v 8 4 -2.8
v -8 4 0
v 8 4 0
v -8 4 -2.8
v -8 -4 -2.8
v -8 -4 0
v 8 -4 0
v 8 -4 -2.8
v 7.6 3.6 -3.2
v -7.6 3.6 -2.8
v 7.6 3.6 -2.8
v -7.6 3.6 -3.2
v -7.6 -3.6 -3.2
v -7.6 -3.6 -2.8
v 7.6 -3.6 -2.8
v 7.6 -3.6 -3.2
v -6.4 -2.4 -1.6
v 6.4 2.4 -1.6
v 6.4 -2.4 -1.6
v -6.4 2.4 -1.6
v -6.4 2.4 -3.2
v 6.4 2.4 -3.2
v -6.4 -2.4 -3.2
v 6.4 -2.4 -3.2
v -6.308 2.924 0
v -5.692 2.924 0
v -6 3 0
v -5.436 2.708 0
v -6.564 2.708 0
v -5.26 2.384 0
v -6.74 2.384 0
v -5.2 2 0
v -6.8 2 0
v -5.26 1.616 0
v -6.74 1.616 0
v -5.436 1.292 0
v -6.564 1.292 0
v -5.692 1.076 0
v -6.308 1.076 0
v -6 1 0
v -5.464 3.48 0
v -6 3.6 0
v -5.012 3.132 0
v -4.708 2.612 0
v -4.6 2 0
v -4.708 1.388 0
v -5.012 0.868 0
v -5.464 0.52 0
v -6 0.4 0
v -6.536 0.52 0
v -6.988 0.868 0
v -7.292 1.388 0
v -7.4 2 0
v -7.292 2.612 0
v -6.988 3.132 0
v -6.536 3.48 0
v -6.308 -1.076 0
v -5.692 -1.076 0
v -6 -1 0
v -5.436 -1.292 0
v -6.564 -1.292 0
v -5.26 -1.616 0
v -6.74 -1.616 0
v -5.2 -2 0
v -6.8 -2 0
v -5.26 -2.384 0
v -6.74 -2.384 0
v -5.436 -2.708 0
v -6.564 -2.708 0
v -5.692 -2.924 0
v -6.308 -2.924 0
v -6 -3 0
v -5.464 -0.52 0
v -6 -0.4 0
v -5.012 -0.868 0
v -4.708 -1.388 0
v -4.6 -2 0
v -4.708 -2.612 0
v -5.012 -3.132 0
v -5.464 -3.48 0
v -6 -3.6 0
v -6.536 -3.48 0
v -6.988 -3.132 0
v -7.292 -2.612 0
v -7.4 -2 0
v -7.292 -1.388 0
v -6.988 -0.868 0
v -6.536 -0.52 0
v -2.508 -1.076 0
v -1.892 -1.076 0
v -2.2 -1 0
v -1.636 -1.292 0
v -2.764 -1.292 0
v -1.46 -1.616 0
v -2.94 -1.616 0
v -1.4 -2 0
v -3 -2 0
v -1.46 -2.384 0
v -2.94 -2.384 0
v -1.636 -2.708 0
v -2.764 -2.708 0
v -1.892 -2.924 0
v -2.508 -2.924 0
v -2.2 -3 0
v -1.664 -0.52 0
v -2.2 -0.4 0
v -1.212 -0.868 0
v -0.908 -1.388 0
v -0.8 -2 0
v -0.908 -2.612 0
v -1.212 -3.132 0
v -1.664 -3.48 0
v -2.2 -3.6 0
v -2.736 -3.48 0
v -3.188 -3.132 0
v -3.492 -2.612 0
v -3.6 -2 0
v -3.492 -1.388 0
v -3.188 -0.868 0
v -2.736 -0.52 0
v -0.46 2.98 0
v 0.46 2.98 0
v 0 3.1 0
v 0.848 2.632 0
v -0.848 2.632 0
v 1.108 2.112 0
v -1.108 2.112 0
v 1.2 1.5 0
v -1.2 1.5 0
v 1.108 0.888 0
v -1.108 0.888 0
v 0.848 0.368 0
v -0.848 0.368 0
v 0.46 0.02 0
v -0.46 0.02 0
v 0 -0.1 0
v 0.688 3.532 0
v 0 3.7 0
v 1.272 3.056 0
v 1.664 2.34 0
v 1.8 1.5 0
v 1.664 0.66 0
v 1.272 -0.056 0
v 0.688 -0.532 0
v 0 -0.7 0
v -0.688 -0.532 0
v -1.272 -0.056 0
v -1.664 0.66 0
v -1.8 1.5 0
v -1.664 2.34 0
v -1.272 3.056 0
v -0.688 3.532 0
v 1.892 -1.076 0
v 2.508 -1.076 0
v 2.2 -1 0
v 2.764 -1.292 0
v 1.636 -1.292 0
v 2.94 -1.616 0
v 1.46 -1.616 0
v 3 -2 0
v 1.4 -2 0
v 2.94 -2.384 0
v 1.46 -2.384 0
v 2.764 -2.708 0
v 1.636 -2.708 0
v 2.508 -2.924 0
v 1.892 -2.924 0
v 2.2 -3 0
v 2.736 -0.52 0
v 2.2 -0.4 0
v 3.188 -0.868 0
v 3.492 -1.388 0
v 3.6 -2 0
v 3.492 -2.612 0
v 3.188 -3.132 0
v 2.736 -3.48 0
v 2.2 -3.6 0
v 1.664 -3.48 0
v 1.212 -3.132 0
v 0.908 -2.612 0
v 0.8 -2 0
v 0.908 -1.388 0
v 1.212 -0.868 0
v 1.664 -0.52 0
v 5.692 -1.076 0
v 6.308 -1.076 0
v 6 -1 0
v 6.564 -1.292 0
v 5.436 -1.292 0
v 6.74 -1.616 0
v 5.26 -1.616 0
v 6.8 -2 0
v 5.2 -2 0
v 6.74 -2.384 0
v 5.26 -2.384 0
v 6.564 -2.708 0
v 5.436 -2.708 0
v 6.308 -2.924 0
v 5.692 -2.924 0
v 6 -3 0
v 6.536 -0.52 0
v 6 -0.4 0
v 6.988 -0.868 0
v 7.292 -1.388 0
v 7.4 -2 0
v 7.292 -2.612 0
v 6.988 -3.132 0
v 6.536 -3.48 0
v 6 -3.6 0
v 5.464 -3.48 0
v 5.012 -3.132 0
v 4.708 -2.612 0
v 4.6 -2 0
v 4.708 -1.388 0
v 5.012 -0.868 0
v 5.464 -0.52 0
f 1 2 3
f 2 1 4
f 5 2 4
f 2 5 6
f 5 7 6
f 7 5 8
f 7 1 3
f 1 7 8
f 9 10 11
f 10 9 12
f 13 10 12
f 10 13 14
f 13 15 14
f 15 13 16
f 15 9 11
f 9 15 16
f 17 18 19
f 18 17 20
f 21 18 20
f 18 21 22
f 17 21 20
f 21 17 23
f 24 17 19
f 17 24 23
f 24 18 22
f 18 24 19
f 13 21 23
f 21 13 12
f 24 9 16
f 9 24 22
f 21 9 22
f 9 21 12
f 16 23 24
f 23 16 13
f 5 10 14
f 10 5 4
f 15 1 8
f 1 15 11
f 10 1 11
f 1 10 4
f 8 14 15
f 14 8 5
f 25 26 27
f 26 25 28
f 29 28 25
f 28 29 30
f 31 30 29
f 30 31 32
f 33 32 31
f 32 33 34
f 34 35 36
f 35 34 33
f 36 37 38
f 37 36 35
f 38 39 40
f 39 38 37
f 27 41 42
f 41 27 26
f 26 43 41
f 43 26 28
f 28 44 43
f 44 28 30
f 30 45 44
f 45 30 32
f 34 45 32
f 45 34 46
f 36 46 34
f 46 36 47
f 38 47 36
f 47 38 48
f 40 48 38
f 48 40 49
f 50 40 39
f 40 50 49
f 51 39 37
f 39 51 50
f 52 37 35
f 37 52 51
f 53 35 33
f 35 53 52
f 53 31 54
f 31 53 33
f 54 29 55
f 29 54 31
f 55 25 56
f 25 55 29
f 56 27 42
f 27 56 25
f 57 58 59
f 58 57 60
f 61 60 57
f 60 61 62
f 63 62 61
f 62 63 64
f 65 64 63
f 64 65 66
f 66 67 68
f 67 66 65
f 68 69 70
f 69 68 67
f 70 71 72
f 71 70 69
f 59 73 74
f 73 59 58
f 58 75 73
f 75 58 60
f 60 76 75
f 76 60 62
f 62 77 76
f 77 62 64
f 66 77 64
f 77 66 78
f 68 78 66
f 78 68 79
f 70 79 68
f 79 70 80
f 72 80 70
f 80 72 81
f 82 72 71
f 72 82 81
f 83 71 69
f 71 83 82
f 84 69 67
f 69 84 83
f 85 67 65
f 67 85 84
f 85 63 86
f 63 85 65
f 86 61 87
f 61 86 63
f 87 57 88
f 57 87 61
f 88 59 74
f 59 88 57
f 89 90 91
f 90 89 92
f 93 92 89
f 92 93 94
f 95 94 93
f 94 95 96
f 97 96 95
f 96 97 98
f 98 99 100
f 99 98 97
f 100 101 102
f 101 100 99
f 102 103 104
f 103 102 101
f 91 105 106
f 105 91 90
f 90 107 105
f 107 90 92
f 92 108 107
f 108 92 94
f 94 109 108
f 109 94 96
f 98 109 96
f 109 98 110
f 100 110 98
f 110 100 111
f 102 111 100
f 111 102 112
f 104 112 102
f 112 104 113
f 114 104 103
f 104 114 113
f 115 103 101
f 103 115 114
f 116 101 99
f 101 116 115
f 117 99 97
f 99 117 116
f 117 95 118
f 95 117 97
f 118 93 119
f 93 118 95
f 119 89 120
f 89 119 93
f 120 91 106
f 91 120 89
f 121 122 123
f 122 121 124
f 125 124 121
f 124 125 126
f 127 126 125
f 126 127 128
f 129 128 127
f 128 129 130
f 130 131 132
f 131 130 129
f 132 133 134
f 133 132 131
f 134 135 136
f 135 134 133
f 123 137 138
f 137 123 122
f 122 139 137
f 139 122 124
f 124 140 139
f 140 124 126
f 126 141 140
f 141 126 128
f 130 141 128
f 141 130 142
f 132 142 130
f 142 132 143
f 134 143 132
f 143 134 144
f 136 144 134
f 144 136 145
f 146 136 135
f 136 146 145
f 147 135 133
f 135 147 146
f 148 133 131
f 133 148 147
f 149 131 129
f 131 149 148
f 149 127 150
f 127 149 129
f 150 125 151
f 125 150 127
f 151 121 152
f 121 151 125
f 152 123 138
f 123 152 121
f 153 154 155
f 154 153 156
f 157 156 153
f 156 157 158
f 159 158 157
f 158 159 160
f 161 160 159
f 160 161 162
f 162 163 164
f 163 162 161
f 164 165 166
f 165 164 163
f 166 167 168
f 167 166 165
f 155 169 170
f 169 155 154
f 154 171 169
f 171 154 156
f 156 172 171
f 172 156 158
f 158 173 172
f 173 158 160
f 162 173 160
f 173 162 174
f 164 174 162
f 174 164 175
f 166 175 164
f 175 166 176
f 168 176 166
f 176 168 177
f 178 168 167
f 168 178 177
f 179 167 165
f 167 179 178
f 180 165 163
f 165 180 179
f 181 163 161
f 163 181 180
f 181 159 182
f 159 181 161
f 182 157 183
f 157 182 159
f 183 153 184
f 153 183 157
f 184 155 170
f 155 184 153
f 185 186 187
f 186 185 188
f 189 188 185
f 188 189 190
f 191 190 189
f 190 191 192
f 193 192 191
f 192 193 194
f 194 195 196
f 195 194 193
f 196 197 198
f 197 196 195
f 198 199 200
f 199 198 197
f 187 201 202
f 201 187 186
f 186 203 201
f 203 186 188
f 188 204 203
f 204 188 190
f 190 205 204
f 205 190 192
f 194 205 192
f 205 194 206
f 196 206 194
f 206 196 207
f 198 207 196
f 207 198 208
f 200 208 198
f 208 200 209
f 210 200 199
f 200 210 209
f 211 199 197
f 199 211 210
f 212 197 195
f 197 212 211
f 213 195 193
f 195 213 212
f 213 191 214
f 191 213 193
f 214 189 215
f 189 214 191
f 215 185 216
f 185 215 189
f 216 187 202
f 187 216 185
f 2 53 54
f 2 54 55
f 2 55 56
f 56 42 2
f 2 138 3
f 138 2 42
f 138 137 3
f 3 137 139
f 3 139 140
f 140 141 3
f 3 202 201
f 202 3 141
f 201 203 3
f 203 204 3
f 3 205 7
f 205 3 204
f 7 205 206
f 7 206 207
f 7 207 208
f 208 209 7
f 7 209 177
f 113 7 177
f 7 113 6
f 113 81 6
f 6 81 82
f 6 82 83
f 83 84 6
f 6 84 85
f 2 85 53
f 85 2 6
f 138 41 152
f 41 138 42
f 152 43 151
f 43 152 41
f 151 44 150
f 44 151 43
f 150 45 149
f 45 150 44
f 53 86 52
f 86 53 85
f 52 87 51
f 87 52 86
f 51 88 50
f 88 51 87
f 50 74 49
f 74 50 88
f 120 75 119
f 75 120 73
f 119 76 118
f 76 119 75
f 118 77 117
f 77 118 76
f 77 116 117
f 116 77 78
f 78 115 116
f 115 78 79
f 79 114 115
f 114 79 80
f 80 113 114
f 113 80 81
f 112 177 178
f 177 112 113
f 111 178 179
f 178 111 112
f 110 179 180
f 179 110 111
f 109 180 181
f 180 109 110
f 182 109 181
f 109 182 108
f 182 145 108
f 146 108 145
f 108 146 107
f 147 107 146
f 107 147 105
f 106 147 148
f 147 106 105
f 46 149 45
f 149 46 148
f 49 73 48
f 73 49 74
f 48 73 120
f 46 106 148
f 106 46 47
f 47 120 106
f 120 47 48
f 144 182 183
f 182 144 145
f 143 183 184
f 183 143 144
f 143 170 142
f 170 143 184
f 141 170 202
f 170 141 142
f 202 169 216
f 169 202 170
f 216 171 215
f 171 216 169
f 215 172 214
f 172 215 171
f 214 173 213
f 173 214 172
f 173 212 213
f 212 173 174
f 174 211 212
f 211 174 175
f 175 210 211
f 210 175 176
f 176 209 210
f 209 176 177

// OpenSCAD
// file: ../p/box5.scad
use <../lib.scad>
function ldraw_lib__box5() = [
// 0 Box with 5 Faces and All Edges
// 0 Name: box5.dat
// 0 Author: James Jessiman
// 0 !LDRAW_ORG Primitive UPDATE 2012-01
// 0 !LICENSE Licensed under CC BY 4.0 : see CAreadme.txt
// 
// 0 BFC CERTIFY CCW
  [0,"BFC","CERTIFY"],
  [0,"BFC","CCW"],
// 
// 0 !HISTORY 2002-04-03 [sbliss] Modified for BFC compliance
// 0 !HISTORY 2002-04-25 [PTadmin] Official Update 2002-02
// 0 !HISTORY 2007-06-24 [PTadmin] Header formatted for Contributor Agreement
// 0 !HISTORY 2008-07-01 [PTadmin] Official Update 2008-01
// 0 !HISTORY 2012-02-16 [Philo] Changed to CCW
// 0 !HISTORY 2012-03-30 [PTadmin] Official Update 2012-01
// 
// 
// 2 24 1 1 1 -1 1 1
  [2,24,1,1,1,-1,1,1],
// 2 24 -1 1 1 -1 1 -1
  [2,24,-1,1,1,-1,1,-1],
// 2 24 -1 1 -1 1 1 -1
  [2,24,-1,1,-1,1,1,-1],
// 2 24 1 1 -1 1 1 1
  [2,24,1,1,-1,1,1,1],
// 2 24 1 0 1 -1 0 1
  [2,24,1,0,1,-1,0,1],
// 2 24 -1 0 1 -1 0 -1
  [2,24,-1,0,1,-1,0,-1],
// 2 24 -1 0 -1 1 0 -1
  [2,24,-1,0,-1,1,0,-1],
// 2 24 1 0 -1 1 0 1
  [2,24,1,0,-1,1,0,1],
// 2 24 1 0 1 1 1 1
  [2,24,1,0,1,1,1,1],
// 2 24 -1 0 1 -1 1 1
  [2,24,-1,0,1,-1,1,1],
// 2 24 1 0 -1 1 1 -1
  [2,24,1,0,-1,1,1,-1],
// 2 24 -1 0 -1 -1 1 -1
  [2,24,-1,0,-1,-1,1,-1],
// 4 16 -1 1 1 1 1 1 1 1 -1 -1 1 -1
  [4,16,-1,1,1,1,1,1,1,1,-1,-1,1,-1],
// 4 16 -1 1 1 -1 0 1 1 0 1 1 1 1
  [4,16,-1,1,1,-1,0,1,1,0,1,1,1,1],
// 4 16 -1 1 -1 -1 0 -1 -1 0 1 -1 1 1
  [4,16,-1,1,-1,-1,0,-1,-1,0,1,-1,1,1],
// 4 16 1 1 -1 1 0 -1 -1 0 -1 -1 1 -1
  [4,16,1,1,-1,1,0,-1,-1,0,-1,-1,1,-1],
// 4 16 1 1 1 1 0 1 1 0 -1 1 1 -1
  [4,16,1,1,1,1,0,1,1,0,-1,1,1,-1],
];
module ldraw_lib__box5(step=0, col=false, unit=2/5, alt=false, line=0.2, solid=!$preview)
    makepoly(ldraw_lib__box5(), step=step, col=col, unit=unit, alt=alt, line=line, solid=solid);
ldraw_lib__box5(line=0.2);
// file: ../p/box4.scad
use <../lib.scad>
function ldraw_lib__box4() = [
// 0 Box with 4 Faces (2 Parallel Pairs) and All Edges
// 0 Name: box4.dat
// 0 Author: James Jessiman
// 0 !LDRAW_ORG Primitive UPDATE 2012-01
// 0 !LICENSE Licensed under CC BY 4.0 : see CAreadme.txt
// 
// 0 BFC CERTIFY CCW
  [0,"BFC","CERTIFY"],
  [0,"BFC","CCW"],
// 
// 0 !HISTORY 2002-04-03 [sbliss] Modified for BFC compliance
// 0 !HISTORY 2002-04-25 [PTadmin] Official Update 2002-02
// 0 !HISTORY 2007-06-24 [PTadmin] Header formatted for Contributor Agreement
// 0 !HISTORY 2008-07-01 [PTadmin] Official Update 2008-01
// 0 !HISTORY 2012-02-16 [Philo] Changed to CCW
// 0 !HISTORY 2012-03-30 [PTadmin] Official Update 2012-01
// 
// 
// 2 24 1 1 1 -1 1 1
  [2,24,1,1,1,-1,1,1],
// 2 24 -1 1 1 -1 1 -1
  [2,24,-1,1,1,-1,1,-1],
// 2 24 -1 1 -1 1 1 -1
  [2,24,-1,1,-1,1,1,-1],
// 2 24 1 1 -1 1 1 1
  [2,24,1,1,-1,1,1,1],
// 2 24 1 0 1 -1 0 1
  [2,24,1,0,1,-1,0,1],
// 2 24 -1 0 1 -1 0 -1
  [2,24,-1,0,1,-1,0,-1],
// 2 24 -1 0 -1 1 0 -1
  [2,24,-1,0,-1,1,0,-1],
// 2 24 1 0 -1 1 0 1
  [2,24,1,0,-1,1,0,1],
// 2 24 1 0 1 1 1 1
  [2,24,1,0,1,1,1,1],
// 2 24 -1 0 1 -1 1 1
  [2,24,-1,0,1,-1,1,1],
// 2 24 1 0 -1 1 1 -1
  [2,24,1,0,-1,1,1,-1],
// 2 24 -1 0 -1 -1 1 -1
  [2,24,-1,0,-1,-1,1,-1],
// 4 16 -1 1 1 -1 0 1 1 0 1 1 1 1
  [4,16,-1,1,1,-1,0,1,1,0,1,1,1,1],
// 4 16 -1 1 -1 -1 0 -1 -1 0 1 -1 1 1
  [4,16,-1,1,-1,-1,0,-1,-1,0,1,-1,1,1],
// 4 16 1 1 -1 1 0 -1 -1 0 -1 -1 1 -1
  [4,16,1,1,-1,1,0,-1,-1,0,-1,-1,1,-1],
// 4 16 1 1 1 1 0 1 1 0 -1 1 1 -1
  [4,16,1,1,1,1,0,1,1,0,-1,1,1,-1],
];
module ldraw_lib__box4(step=0, col=false, unit=2/5, alt=false, line=0.2, solid=!$preview)
    makepoly(ldraw_lib__box4(), step=step, col=col, unit=unit, alt=alt, line=line, solid=solid);
ldraw_lib__box4(line=0.2);
// file: s/3069bs01.scad
use <../../lib.scad>
use <../../p/box4.scad>
use <../../p/box5.scad>
function ldraw_lib__s__3069bs01() = [
// 0 ~Tile  1 x  2 with Groove without Top Face
// 0 Name: s\3069bs01.dat
// 0 Author: Santeri Piippo [arezey]
// 0 !LDRAW_ORG Subpart UPDATE 2010-02
// 0 !LICENSE Licensed under CC BY 4.0 : see CAreadme.txt
// 
// 0 BFC CERTIFY CCW
  [0,"BFC","CERTIFY"],
  [0,"BFC","CCW"],
// 
// 0 !HISTORY 2010-07-05 [PTadmin] Official Update 2010-02
// 
// 
// 1 16 0 0 0 20 0 0 0 7 0 0 0 10 box4.dat
  [1,16,0,0,0,20,0,0,0,7,0,0,0,10, ldraw_lib__box4()],
// 1 16 0 7 0 19 0 0 0 1 0 0 0 9 box4.dat
  [1,16,0,7,0,19,0,0,0,1,0,0,0,9, ldraw_lib__box4()],
// 0 BFC INVERTNEXT
  [0,"BFC","INVERTNEXT"],
// 1 16 0 8 0 16 0 0 0 -4 0 0 0 6 box5.dat
  [1,16,0,8,0,16,0,0,0,-4,0,0,0,6, ldraw_lib__box5()],
// 4 16 -19 8 9 -16 8 6 -16 8 -6 -19 8 -9
  [4,16,-19,8,9,-16,8,6,-16,8,-6,-19,8,-9],
// 4 16 19 8 -9 16 8 -6 16 8 6 19 8 9
  [4,16,19,8,-9,16,8,-6,16,8,6,19,8,9],
// 4 16 19 8 9 16 8 6 -16 8 6 -19 8 9
  [4,16,19,8,9,16,8,6,-16,8,6,-19,8,9],
// 4 16 -19 8 -9 -16 8 -6 16 8 -6 19 8 -9
  [4,16,-19,8,-9,-16,8,-6,16,8,-6,19,8,-9],
// 4 16 -20 7 10 -19 7 9 -19 7 -9 -20 7 -10
  [4,16,-20,7,10,-19,7,9,-19,7,-9,-20,7,-10],
// 4 16 20 7 -10 19 7 -9 19 7 9 20 7 10
  [4,16,20,7,-10,19,7,-9,19,7,9,20,7,10],
// 4 16 20 7 10 19 7 9 -19 7 9 -20 7 10
  [4,16,20,7,10,19,7,9,-19,7,9,-20,7,10],
// 4 16 -20 7 -10 -19 7 -9 19 7 -9 20 7 -10
  [4,16,-20,7,-10,-19,7,-9,19,7,-9,20,7,-10],
// 0 //
];
module ldraw_lib__s__3069bs01(step=0, col=false, unit=2/5, alt=false, line=0.2, solid=!$preview)
    makepoly(ldraw_lib__s__3069bs01(), step=step, col=col, unit=unit, alt=alt, line=line, solid=solid);
ldraw_lib__s__3069bs01(line=0.2);
// main file
use <../lib.scad>
use <s/3069bs01.scad>
function ldraw_lib__3069bpzj() = [
// 0 Tile  1 x  2 with  6 Coloured Ovals with Black Outlines Pattern
// 0 Name: 3069bpzj.dat
// 0 Author: Vincent Messenet [Cheenzo]
// 0 !LDRAW_ORG Part UPDATE 2020-03
// 0 !LICENSE Licensed under CC BY 4.0 : see CAreadme.txt
// 
// 0 BFC CERTIFY CCW
  [0,"BFC","CERTIFY"],
  [0,"BFC","CCW"],
// 
// 0 !KEYWORDS Avengers, Brickheadz, BrickLink 3069bpb638, Infinity Gauntlet
// 0 !KEYWORDS Infinity War, Set 41605, Thanos
// 
// 0 !HISTORY 2020-12-29 [PTadmin] Official Update 2020-03
// 
// 
// 1 16 0 0 0 1 0 0 0 1 0 0 0 1 s\3069bs01.dat
  [1,16,0,0,0,1,0,0,0,1,0,0,0,1, ldraw_lib__s__3069bs01()],
// 
// 4 27 -14.23 0 7.31 -15 0 7.5 -15.77 0 7.31 -13.59 0 6.77
  [4,27,-14.23,0,7.31,-15,0,7.5,-15.77,0,7.31,-13.59,0,6.77],
// 4 27 -13.15 0 5.96 -13.59 0 6.77 -15.77 0 7.31 -16.41 0 6.77
  [4,27,-13.15,0,5.96,-13.59,0,6.77,-15.77,0,7.31,-16.41,0,6.77],
// 4 27 -13 0 5 -13.15 0 5.96 -16.41 0 6.77 -16.85 0 5.96
  [4,27,-13,0,5,-13.15,0,5.96,-16.41,0,6.77,-16.85,0,5.96],
// 4 27 -13.15 0 4.04 -13 0 5 -16.85 0 5.96 -17 0 5
  [4,27,-13.15,0,4.04,-13,0,5,-16.85,0,5.96,-17,0,5],
// 4 27 -13.59 0 3.23 -13.15 0 4.04 -17 0 5 -16.85 0 4.04
  [4,27,-13.59,0,3.23,-13.15,0,4.04,-17,0,5,-16.85,0,4.04],
// 4 27 -14.23 0 2.69 -13.59 0 3.23 -16.85 0 4.04 -16.41 0 3.23
  [4,27,-14.23,0,2.69,-13.59,0,3.23,-16.85,0,4.04,-16.41,0,3.23],
// 4 27 -15 0 2.5 -14.23 0 2.69 -16.41 0 3.23 -15.77 0 2.69
  [4,27,-15,0,2.5,-14.23,0,2.69,-16.41,0,3.23,-15.77,0,2.69],
// 
// 4 0 -13.66 0 8.7 -15 0 9 -15 0 7.5 -14.23 0 7.31
  [4,0,-13.66,0,8.7,-15,0,9,-15,0,7.5,-14.23,0,7.31],
// 4 0 -12.53 0 7.83 -13.66 0 8.7 -14.23 0 7.31 -13.59 0 6.77
  [4,0,-12.53,0,7.83,-13.66,0,8.7,-14.23,0,7.31,-13.59,0,6.77],
// 4 0 -11.77 0 6.53 -12.53 0 7.83 -13.59 0 6.77 -13.15 0 5.96
  [4,0,-11.77,0,6.53,-12.53,0,7.83,-13.59,0,6.77,-13.15,0,5.96],
// 4 0 -11.5 0 5 -11.77 0 6.53 -13.15 0 5.96 -13 0 5
  [4,0,-11.5,0,5,-11.77,0,6.53,-13.15,0,5.96,-13,0,5],
// 4 0 -11.77 0 3.47 -11.5 0 5 -13 0 5 -13.15 0 4.04
  [4,0,-11.77,0,3.47,-11.5,0,5,-13,0,5,-13.15,0,4.04],
// 4 0 -12.53 0 2.17 -11.77 0 3.47 -13.15 0 4.04 -13.59 0 3.23
  [4,0,-12.53,0,2.17,-11.77,0,3.47,-13.15,0,4.04,-13.59,0,3.23],
// 4 0 -13.66 0 1.3 -12.53 0 2.17 -13.59 0 3.23 -14.23 0 2.69
  [4,0,-13.66,0,1.3,-12.53,0,2.17,-13.59,0,3.23,-14.23,0,2.69],
// 4 0 -15 0 1 -13.66 0 1.3 -14.23 0 2.69 -15 0 2.5
  [4,0,-15,0,1,-13.66,0,1.3,-14.23,0,2.69,-15,0,2.5],
// 4 0 -16.34 0 1.3 -15 0 1 -15 0 2.5 -15.77 0 2.69
  [4,0,-16.34,0,1.3,-15,0,1,-15,0,2.5,-15.77,0,2.69],
// 4 0 -16.34 0 1.3 -15.77 0 2.69 -16.41 0 3.23 -17.47 0 2.17
  [4,0,-16.34,0,1.3,-15.77,0,2.69,-16.41,0,3.23,-17.47,0,2.17],
// 4 0 -17.47 0 2.17 -16.41 0 3.23 -16.85 0 4.04 -18.23 0 3.47
  [4,0,-17.47,0,2.17,-16.41,0,3.23,-16.85,0,4.04,-18.23,0,3.47],
// 4 0 -18.23 0 3.47 -16.85 0 4.04 -17 0 5 -18.5 0 5
  [4,0,-18.23,0,3.47,-16.85,0,4.04,-17,0,5,-18.5,0,5],
// 4 0 -18.5 0 5 -17 0 5 -16.85 0 5.96 -18.23 0 6.53
  [4,0,-18.5,0,5,-17,0,5,-16.85,0,5.96,-18.23,0,6.53],
// 4 0 -17.47 0 7.83 -18.23 0 6.53 -16.85 0 5.96 -16.41 0 6.77
  [4,0,-17.47,0,7.83,-18.23,0,6.53,-16.85,0,5.96,-16.41,0,6.77],
// 4 0 -16.34 0 8.7 -17.47 0 7.83 -16.41 0 6.77 -15.77 0 7.31
  [4,0,-16.34,0,8.7,-17.47,0,7.83,-16.41,0,6.77,-15.77,0,7.31],
// 4 0 -15 0 9 -16.34 0 8.7 -15.77 0 7.31 -15 0 7.5
  [4,0,-15,0,9,-16.34,0,8.7,-15.77,0,7.31,-15,0,7.5],
// 
// 4 26 -14.23 0 -2.69 -15 0 -2.5 -15.77 0 -2.69 -13.59 0 -3.23
  [4,26,-14.23,0,-2.69,-15,0,-2.5,-15.77,0,-2.69,-13.59,0,-3.23],
// 4 26 -13.15 0 -4.04 -13.59 0 -3.23 -15.77 0 -2.69 -16.41 0 -3.23
  [4,26,-13.15,0,-4.04,-13.59,0,-3.23,-15.77,0,-2.69,-16.41,0,-3.23],
// 4 26 -13 0 -5 -13.15 0 -4.04 -16.41 0 -3.23 -16.85 0 -4.04
  [4,26,-13,0,-5,-13.15,0,-4.04,-16.41,0,-3.23,-16.85,0,-4.04],
// 4 26 -13.15 0 -5.96 -13 0 -5 -16.85 0 -4.04 -17 0 -5
  [4,26,-13.15,0,-5.96,-13,0,-5,-16.85,0,-4.04,-17,0,-5],
// 4 26 -13.59 0 -6.77 -13.15 0 -5.96 -17 0 -5 -16.85 0 -5.96
  [4,26,-13.59,0,-6.77,-13.15,0,-5.96,-17,0,-5,-16.85,0,-5.96],
// 4 26 -14.23 0 -7.31 -13.59 0 -6.77 -16.85 0 -5.96 -16.41 0 -6.77
  [4,26,-14.23,0,-7.31,-13.59,0,-6.77,-16.85,0,-5.96,-16.41,0,-6.77],
// 4 26 -15 0 -7.5 -14.23 0 -7.31 -16.41 0 -6.77 -15.77 0 -7.31
  [4,26,-15,0,-7.5,-14.23,0,-7.31,-16.41,0,-6.77,-15.77,0,-7.31],
// 
// 4 0 -15 0 -1 -15 0 -2.5 -14.23 0 -2.69 -13.66 0 -1.3
  [4,0,-15,0,-1,-15,0,-2.5,-14.23,0,-2.69,-13.66,0,-1.3],
// 4 0 -12.53 0 -2.17 -13.66 0 -1.3 -14.23 0 -2.69 -13.59 0 -3.23
  [4,0,-12.53,0,-2.17,-13.66,0,-1.3,-14.23,0,-2.69,-13.59,0,-3.23],
// 4 0 -11.77 0 -3.47 -12.53 0 -2.17 -13.59 0 -3.23 -13.15 0 -4.04
  [4,0,-11.77,0,-3.47,-12.53,0,-2.17,-13.59,0,-3.23,-13.15,0,-4.04],
// 4 0 -11.5 0 -5 -11.77 0 -3.47 -13.15 0 -4.04 -13 0 -5
  [4,0,-11.5,0,-5,-11.77,0,-3.47,-13.15,0,-4.04,-13,0,-5],
// 4 0 -11.77 0 -6.53 -11.5 0 -5 -13 0 -5 -13.15 0 -5.96
  [4,0,-11.77,0,-6.53,-11.5,0,-5,-13,0,-5,-13.15,0,-5.96],
// 4 0 -12.53 0 -7.83 -11.77 0 -6.53 -13.15 0 -5.96 -13.59 0 -6.77
  [4,0,-12.53,0,-7.83,-11.77,0,-6.53,-13.15,0,-5.96,-13.59,0,-6.77],
// 4 0 -13.66 0 -8.7 -12.53 0 -7.83 -13.59 0 -6.77 -14.23 0 -7.31
  [4,0,-13.66,0,-8.7,-12.53,0,-7.83,-13.59,0,-6.77,-14.23,0,-7.31],
// 4 0 -15 0 -9 -13.66 0 -8.7 -14.23 0 -7.31 -15 0 -7.5
  [4,0,-15,0,-9,-13.66,0,-8.7,-14.23,0,-7.31,-15,0,-7.5],
// 4 0 -15 0 -9 -15 0 -7.5 -15.77 0 -7.31 -16.34 0 -8.7
  [4,0,-15,0,-9,-15,0,-7.5,-15.77,0,-7.31,-16.34,0,-8.7],
// 4 0 -16.34 0 -8.7 -15.77 0 -7.31 -16.41 0 -6.77 -17.47 0 -7.83
  [4,0,-16.34,0,-8.7,-15.77,0,-7.31,-16.41,0,-6.77,-17.47,0,-7.83],
// 4 0 -17.47 0 -7.83 -16.41 0 -6.77 -16.85 0 -5.96 -18.23 0 -6.53
  [4,0,-17.47,0,-7.83,-16.41,0,-6.77,-16.85,0,-5.96,-18.23,0,-6.53],
// 4 0 -18.23 0 -6.53 -16.85 0 -5.96 -17 0 -5 -18.5 0 -5
  [4,0,-18.23,0,-6.53,-16.85,0,-5.96,-17,0,-5,-18.5,0,-5],
// 4 0 -18.5 0 -5 -17 0 -5 -16.85 0 -4.04 -18.23 0 -3.47
  [4,0,-18.5,0,-5,-17,0,-5,-16.85,0,-4.04,-18.23,0,-3.47],
// 4 0 -17.47 0 -2.17 -18.23 0 -3.47 -16.85 0 -4.04 -16.41 0 -3.23
  [4,0,-17.47,0,-2.17,-18.23,0,-3.47,-16.85,0,-4.04,-16.41,0,-3.23],
// 4 0 -16.34 0 -1.3 -17.47 0 -2.17 -16.41 0 -3.23 -15.77 0 -2.69
  [4,0,-16.34,0,-1.3,-17.47,0,-2.17,-16.41,0,-3.23,-15.77,0,-2.69],
// 4 0 -15 0 -1 -16.34 0 -1.3 -15.77 0 -2.69 -15 0 -2.5
  [4,0,-15,0,-1,-16.34,0,-1.3,-15.77,0,-2.69,-15,0,-2.5],
// 
// 4 1 -4.73 0 -2.69 -5.5 0 -2.5 -6.27 0 -2.69 -4.09 0 -3.23
  [4,1,-4.73,0,-2.69,-5.5,0,-2.5,-6.27,0,-2.69,-4.09,0,-3.23],
// 4 1 -3.65 0 -4.04 -4.09 0 -3.23 -6.27 0 -2.69 -6.91 0 -3.23
  [4,1,-3.65,0,-4.04,-4.09,0,-3.23,-6.27,0,-2.69,-6.91,0,-3.23],
// 4 1 -3.5 0 -5 -3.65 0 -4.04 -6.91 0 -3.23 -7.35 0 -4.04
  [4,1,-3.5,0,-5,-3.65,0,-4.04,-6.91,0,-3.23,-7.35,0,-4.04],
// 4 1 -3.65 0 -5.96 -3.5 0 -5 -7.35 0 -4.04 -7.5 0 -5
  [4,1,-3.65,0,-5.96,-3.5,0,-5,-7.35,0,-4.04,-7.5,0,-5],
// 4 1 -4.09 0 -6.77 -3.65 0 -5.96 -7.5 0 -5 -7.35 0 -5.96
  [4,1,-4.09,0,-6.77,-3.65,0,-5.96,-7.5,0,-5,-7.35,0,-5.96],
// 4 1 -4.73 0 -7.31 -4.09 0 -6.77 -7.35 0 -5.96 -6.91 0 -6.77
  [4,1,-4.73,0,-7.31,-4.09,0,-6.77,-7.35,0,-5.96,-6.91,0,-6.77],
// 4 1 -5.5 0 -7.5 -4.73 0 -7.31 -6.91 0 -6.77 -6.27 0 -7.31
  [4,1,-5.5,0,-7.5,-4.73,0,-7.31,-6.91,0,-6.77,-6.27,0,-7.31],
// 
// 4 0 -4.16 0 -1.3 -5.5 0 -1 -5.5 0 -2.5 -4.73 0 -2.69
  [4,0,-4.16,0,-1.3,-5.5,0,-1,-5.5,0,-2.5,-4.73,0,-2.69],
// 4 0 -3.03 0 -2.17 -4.16 0 -1.3 -4.73 0 -2.69 -4.09 0 -3.23
  [4,0,-3.03,0,-2.17,-4.16,0,-1.3,-4.73,0,-2.69,-4.09,0,-3.23],
// 4 0 -2.27 0 -3.47 -3.03 0 -2.17 -4.09 0 -3.23 -3.65 0 -4.04
  [4,0,-2.27,0,-3.47,-3.03,0,-2.17,-4.09,0,-3.23,-3.65,0,-4.04],
// 4 0 -2 0 -5 -2.27 0 -3.47 -3.65 0 -4.04 -3.5 0 -5
  [4,0,-2,0,-5,-2.27,0,-3.47,-3.65,0,-4.04,-3.5,0,-5],
// 4 0 -2.27 0 -6.53 -2 0 -5 -3.5 0 -5 -3.65 0 -5.96
  [4,0,-2.27,0,-6.53,-2,0,-5,-3.5,0,-5,-3.65,0,-5.96],
// 4 0 -3.03 0 -7.83 -2.27 0 -6.53 -3.65 0 -5.96 -4.09 0 -6.77
  [4,0,-3.03,0,-7.83,-2.27,0,-6.53,-3.65,0,-5.96,-4.09,0,-6.77],
// 4 0 -4.16 0 -8.7 -3.03 0 -7.83 -4.09 0 -6.77 -4.73 0 -7.31
  [4,0,-4.16,0,-8.7,-3.03,0,-7.83,-4.09,0,-6.77,-4.73,0,-7.31],
// 4 0 -5.5 0 -9 -4.16 0 -8.7 -4.73 0 -7.31 -5.5 0 -7.5
  [4,0,-5.5,0,-9,-4.16,0,-8.7,-4.73,0,-7.31,-5.5,0,-7.5],
// 4 0 -5.5 0 -9 -5.5 0 -7.5 -6.27 0 -7.31 -6.84 0 -8.7
  [4,0,-5.5,0,-9,-5.5,0,-7.5,-6.27,0,-7.31,-6.84,0,-8.7],
// 4 0 -6.84 0 -8.7 -6.27 0 -7.31 -6.91 0 -6.77 -7.97 0 -7.83
  [4,0,-6.84,0,-8.7,-6.27,0,-7.31,-6.91,0,-6.77,-7.97,0,-7.83],
// 4 0 -7.97 0 -7.83 -6.91 0 -6.77 -7.35 0 -5.96 -8.73 0 -6.53
  [4,0,-7.97,0,-7.83,-6.91,0,-6.77,-7.35,0,-5.96,-8.73,0,-6.53],
// 4 0 -8.73 0 -6.53 -7.35 0 -5.96 -7.5 0 -5 -9 0 -5
  [4,0,-8.73,0,-6.53,-7.35,0,-5.96,-7.5,0,-5,-9,0,-5],
// 4 0 -8.73 0 -3.47 -9 0 -5 -7.5 0 -5 -7.35 0 -4.04
  [4,0,-8.73,0,-3.47,-9,0,-5,-7.5,0,-5,-7.35,0,-4.04],
// 4 0 -7.97 0 -2.17 -8.73 0 -3.47 -7.35 0 -4.04 -6.91 0 -3.23
  [4,0,-7.97,0,-2.17,-8.73,0,-3.47,-7.35,0,-4.04,-6.91,0,-3.23],
// 4 0 -6.84 0 -1.3 -7.97 0 -2.17 -6.91 0 -3.23 -6.27 0 -2.69
  [4,0,-6.84,0,-1.3,-7.97,0,-2.17,-6.91,0,-3.23,-6.27,0,-2.69],
// 4 0 -5.5 0 -1 -6.84 0 -1.3 -6.27 0 -2.69 -5.5 0 -2.5
  [4,0,-5.5,0,-1,-6.84,0,-1.3,-6.27,0,-2.69,-5.5,0,-2.5],
// 
// 4 14 1.15 0 7.45 0 0 7.75 -1.15 0 7.45 2.12 0 6.58
  [4,14,1.15,0,7.45,0,0,7.75,-1.15,0,7.45,2.12,0,6.58],
// 4 14 2.12 0 6.58 -1.15 0 7.45 -2.12 0 6.58 2.77 0 5.28
  [4,14,2.12,0,6.58,-1.15,0,7.45,-2.12,0,6.58,2.77,0,5.28],
// 4 14 2.77 0 5.28 -2.12 0 6.58 -2.77 0 5.28 3 0 3.75
  [4,14,2.77,0,5.28,-2.12,0,6.58,-2.77,0,5.28,3,0,3.75],
// 4 14 3 0 3.75 -2.77 0 5.28 -3 0 3.75 2.77 0 2.22
  [4,14,3,0,3.75,-2.77,0,5.28,-3,0,3.75,2.77,0,2.22],
// 4 14 2.77 0 2.22 -3 0 3.75 -2.77 0 2.22 2.12 0 .92
  [4,14,2.77,0,2.22,-3,0,3.75,-2.77,0,2.22,2.12,0,.92],
// 4 14 2.12 0 .92 -2.77 0 2.22 -2.12 0 .92 1.15 0 .05
  [4,14,2.12,0,.92,-2.77,0,2.22,-2.12,0,.92,1.15,0,.05],
// 4 14 1.15 0 .05 -2.12 0 .92 -1.15 0 .05 0 0 -.25
  [4,14,1.15,0,.05,-2.12,0,.92,-1.15,0,.05,0,0,-.25],
// 
// 4 0 1.72 0 8.83 0 0 9.25 0 0 7.75 1.15 0 7.45
  [4,0,1.72,0,8.83,0,0,9.25,0,0,7.75,1.15,0,7.45],
// 4 0 3.18 0 7.64 1.72 0 8.83 1.15 0 7.45 2.12 0 6.58
  [4,0,3.18,0,7.64,1.72,0,8.83,1.15,0,7.45,2.12,0,6.58],
// 4 0 4.16 0 5.85 3.18 0 7.64 2.12 0 6.58 2.77 0 5.28
  [4,0,4.16,0,5.85,3.18,0,7.64,2.12,0,6.58,2.77,0,5.28],
// 4 0 4.5 0 3.75 4.16 0 5.85 2.77 0 5.28 3 0 3.75
  [4,0,4.5,0,3.75,4.16,0,5.85,2.77,0,5.28,3,0,3.75],
// 4 0 4.16 0 1.65 4.5 0 3.75 3 0 3.75 2.77 0 2.22
  [4,0,4.16,0,1.65,4.5,0,3.75,3,0,3.75,2.77,0,2.22],
// 4 0 3.18 0 -.14 4.16 0 1.65 2.77 0 2.22 2.12 0 .92
  [4,0,3.18,0,-.14,4.16,0,1.65,2.77,0,2.22,2.12,0,.92],
// 4 0 1.72 0 -1.33 3.18 0 -.14 2.12 0 .92 1.15 0 .05
  [4,0,1.72,0,-1.33,3.18,0,-.14,2.12,0,.92,1.15,0,.05],
// 4 0 0 0 -1.75 1.72 0 -1.33 1.15 0 .05 0 0 -.25
  [4,0,0,0,-1.75,1.72,0,-1.33,1.15,0,.05,0,0,-.25],
// 4 0 -1.72 0 -1.33 0 0 -1.75 0 0 -.25 -1.15 0 .05
  [4,0,-1.72,0,-1.33,0,0,-1.75,0,0,-.25,-1.15,0,.05],
// 4 0 -3.18 0 -.14 -1.72 0 -1.33 -1.15 0 .05 -2.12 0 .92
  [4,0,-3.18,0,-.14,-1.72,0,-1.33,-1.15,0,.05,-2.12,0,.92],
// 4 0 -4.16 0 1.65 -3.18 0 -.14 -2.12 0 .92 -2.77 0 2.22
  [4,0,-4.16,0,1.65,-3.18,0,-.14,-2.12,0,.92,-2.77,0,2.22],
// 4 0 -4.5 0 3.75 -4.16 0 1.65 -2.77 0 2.22 -3 0 3.75
  [4,0,-4.5,0,3.75,-4.16,0,1.65,-2.77,0,2.22,-3,0,3.75],
// 4 0 -4.16 0 5.85 -4.5 0 3.75 -3 0 3.75 -2.77 0 5.28
  [4,0,-4.16,0,5.85,-4.5,0,3.75,-3,0,3.75,-2.77,0,5.28],
// 4 0 -3.18 0 7.64 -4.16 0 5.85 -2.77 0 5.28 -2.12 0 6.58
  [4,0,-3.18,0,7.64,-4.16,0,5.85,-2.77,0,5.28,-2.12,0,6.58],
// 4 0 -1.72 0 8.83 -3.18 0 7.64 -2.12 0 6.58 -1.15 0 7.45
  [4,0,-1.72,0,8.83,-3.18,0,7.64,-2.12,0,6.58,-1.15,0,7.45],
// 4 0 0 0 9.25 -1.72 0 8.83 -1.15 0 7.45 0 0 7.75
  [4,0,0,0,9.25,-1.72,0,8.83,-1.15,0,7.45,0,0,7.75],
// 
// 4 4 6.27 0 -2.69 5.5 0 -2.5 4.73 0 -2.69 6.91 0 -3.23
  [4,4,6.27,0,-2.69,5.5,0,-2.5,4.73,0,-2.69,6.91,0,-3.23],
// 4 4 6.91 0 -3.23 4.73 0 -2.69 4.09 0 -3.23 7.35 0 -4.04
  [4,4,6.91,0,-3.23,4.73,0,-2.69,4.09,0,-3.23,7.35,0,-4.04],
// 4 4 7.5 0 -5 7.35 0 -4.04 4.09 0 -3.23 3.65 0 -4.04
  [4,4,7.5,0,-5,7.35,0,-4.04,4.09,0,-3.23,3.65,0,-4.04],
// 4 4 7.5 0 -5 3.65 0 -4.04 3.5 0 -5 7.35 0 -5.96
  [4,4,7.5,0,-5,3.65,0,-4.04,3.5,0,-5,7.35,0,-5.96],
// 4 4 6.91 0 -6.77 7.35 0 -5.96 3.5 0 -5 3.65 0 -5.96
  [4,4,6.91,0,-6.77,7.35,0,-5.96,3.5,0,-5,3.65,0,-5.96],
// 4 4 6.91 0 -6.77 3.65 0 -5.96 4.09 0 -6.77 6.27 0 -7.31
  [4,4,6.91,0,-6.77,3.65,0,-5.96,4.09,0,-6.77,6.27,0,-7.31],
// 4 4 5.5 0 -7.5 6.27 0 -7.31 4.09 0 -6.77 4.73 0 -7.31
  [4,4,5.5,0,-7.5,6.27,0,-7.31,4.09,0,-6.77,4.73,0,-7.31],
// 
// 4 0 6.84 0 -1.3 5.5 0 -1 5.5 0 -2.5 6.27 0 -2.69
  [4,0,6.84,0,-1.3,5.5,0,-1,5.5,0,-2.5,6.27,0,-2.69],
// 4 0 7.97 0 -2.17 6.84 0 -1.3 6.27 0 -2.69 6.91 0 -3.23
  [4,0,7.97,0,-2.17,6.84,0,-1.3,6.27,0,-2.69,6.91,0,-3.23],
// 4 0 8.73 0 -3.47 7.97 0 -2.17 6.91 0 -3.23 7.35 0 -4.04
  [4,0,8.73,0,-3.47,7.97,0,-2.17,6.91,0,-3.23,7.35,0,-4.04],
// 4 0 9 0 -5 8.73 0 -3.47 7.35 0 -4.04 7.5 0 -5
  [4,0,9,0,-5,8.73,0,-3.47,7.35,0,-4.04,7.5,0,-5],
// 4 0 8.73 0 -6.53 9 0 -5 7.5 0 -5 7.35 0 -5.96
  [4,0,8.73,0,-6.53,9,0,-5,7.5,0,-5,7.35,0,-5.96],
// 4 0 7.97 0 -7.83 8.73 0 -6.53 7.35 0 -5.96 6.91 0 -6.77
  [4,0,7.97,0,-7.83,8.73,0,-6.53,7.35,0,-5.96,6.91,0,-6.77],
// 4 0 6.84 0 -8.7 7.97 0 -7.83 6.91 0 -6.77 6.27 0 -7.31
  [4,0,6.84,0,-8.7,7.97,0,-7.83,6.91,0,-6.77,6.27,0,-7.31],
// 4 0 5.5 0 -9 6.84 0 -8.7 6.27 0 -7.31 5.5 0 -7.5
  [4,0,5.5,0,-9,6.84,0,-8.7,6.27,0,-7.31,5.5,0,-7.5],
// 4 0 4.16 0 -8.7 5.5 0 -9 5.5 0 -7.5 4.73 0 -7.31
  [4,0,4.16,0,-8.7,5.5,0,-9,5.5,0,-7.5,4.73,0,-7.31],
// 4 0 3.03 0 -7.83 4.16 0 -8.7 4.73 0 -7.31 4.09 0 -6.77
  [4,0,3.03,0,-7.83,4.16,0,-8.7,4.73,0,-7.31,4.09,0,-6.77],
// 4 0 2.27 0 -6.53 3.03 0 -7.83 4.09 0 -6.77 3.65 0 -5.96
  [4,0,2.27,0,-6.53,3.03,0,-7.83,4.09,0,-6.77,3.65,0,-5.96],
// 4 0 2 0 -5 2.27 0 -6.53 3.65 0 -5.96 3.5 0 -5
  [4,0,2,0,-5,2.27,0,-6.53,3.65,0,-5.96,3.5,0,-5],
// 4 0 2.27 0 -3.47 2 0 -5 3.5 0 -5 3.65 0 -4.04
  [4,0,2.27,0,-3.47,2,0,-5,3.5,0,-5,3.65,0,-4.04],
// 4 0 3.03 0 -2.17 2.27 0 -3.47 3.65 0 -4.04 4.09 0 -3.23
  [4,0,3.03,0,-2.17,2.27,0,-3.47,3.65,0,-4.04,4.09,0,-3.23],
// 4 0 4.16 0 -1.3 3.03 0 -2.17 4.09 0 -3.23 4.73 0 -2.69
  [4,0,4.16,0,-1.3,3.03,0,-2.17,4.09,0,-3.23,4.73,0,-2.69],
// 4 0 5.5 0 -1 4.16 0 -1.3 4.73 0 -2.69 5.5 0 -2.5
  [4,0,5.5,0,-1,4.16,0,-1.3,4.73,0,-2.69,5.5,0,-2.5],
// 
// 4 25 15.77 0 -2.69 15 0 -2.5 14.23 0 -2.69 16.41 0 -3.23
  [4,25,15.77,0,-2.69,15,0,-2.5,14.23,0,-2.69,16.41,0,-3.23],
// 4 25 16.85 0 -4.04 16.41 0 -3.23 14.23 0 -2.69 13.59 0 -3.23
  [4,25,16.85,0,-4.04,16.41,0,-3.23,14.23,0,-2.69,13.59,0,-3.23],
// 4 25 16.85 0 -4.04 13.59 0 -3.23 13.15 0 -4.04 17 0 -5
  [4,25,16.85,0,-4.04,13.59,0,-3.23,13.15,0,-4.04,17,0,-5],
// 4 25 17 0 -5 13.15 0 -4.04 13 0 -5 16.85 0 -5.96
  [4,25,17,0,-5,13.15,0,-4.04,13,0,-5,16.85,0,-5.96],
// 4 25 16.41 0 -6.77 16.85 0 -5.96 13 0 -5 13.15 0 -5.96
  [4,25,16.41,0,-6.77,16.85,0,-5.96,13,0,-5,13.15,0,-5.96],
// 4 25 16.41 0 -6.77 13.15 0 -5.96 13.59 0 -6.77 15.77 0 -7.31
  [4,25,16.41,0,-6.77,13.15,0,-5.96,13.59,0,-6.77,15.77,0,-7.31],
// 4 25 15 0 -7.5 15.77 0 -7.31 13.59 0 -6.77 14.23 0 -7.31
  [4,25,15,0,-7.5,15.77,0,-7.31,13.59,0,-6.77,14.23,0,-7.31],
// 
// 4 0 16.34 0 -1.3 15 0 -1 15 0 -2.5 15.77 0 -2.69
  [4,0,16.34,0,-1.3,15,0,-1,15,0,-2.5,15.77,0,-2.69],
// 4 0 17.47 0 -2.17 16.34 0 -1.3 15.77 0 -2.69 16.41 0 -3.23
  [4,0,17.47,0,-2.17,16.34,0,-1.3,15.77,0,-2.69,16.41,0,-3.23],
// 4 0 18.23 0 -3.47 17.47 0 -2.17 16.41 0 -3.23 16.85 0 -4.04
  [4,0,18.23,0,-3.47,17.47,0,-2.17,16.41,0,-3.23,16.85,0,-4.04],
// 4 0 18.5 0 -5 18.23 0 -3.47 16.85 0 -4.04 17 0 -5
  [4,0,18.5,0,-5,18.23,0,-3.47,16.85,0,-4.04,17,0,-5],
// 4 0 18.23 0 -6.53 18.5 0 -5 17 0 -5 16.85 0 -5.96
  [4,0,18.23,0,-6.53,18.5,0,-5,17,0,-5,16.85,0,-5.96],
// 4 0 17.47 0 -7.83 18.23 0 -6.53 16.85 0 -5.96 16.41 0 -6.77
  [4,0,17.47,0,-7.83,18.23,0,-6.53,16.85,0,-5.96,16.41,0,-6.77],
// 4 0 16.34 0 -8.7 17.47 0 -7.83 16.41 0 -6.77 15.77 0 -7.31
  [4,0,16.34,0,-8.7,17.47,0,-7.83,16.41,0,-6.77,15.77,0,-7.31],
// 4 0 15 0 -9 16.34 0 -8.7 15.77 0 -7.31 15 0 -7.5
  [4,0,15,0,-9,16.34,0,-8.7,15.77,0,-7.31,15,0,-7.5],
// 4 0 13.66 0 -8.7 15 0 -9 15 0 -7.5 14.23 0 -7.31
  [4,0,13.66,0,-8.7,15,0,-9,15,0,-7.5,14.23,0,-7.31],
// 4 0 12.53 0 -7.83 13.66 0 -8.7 14.23 0 -7.31 13.59 0 -6.77
  [4,0,12.53,0,-7.83,13.66,0,-8.7,14.23,0,-7.31,13.59,0,-6.77],
// 4 0 11.77 0 -6.53 12.53 0 -7.83 13.59 0 -6.77 13.15 0 -5.96
  [4,0,11.77,0,-6.53,12.53,0,-7.83,13.59,0,-6.77,13.15,0,-5.96],
// 4 0 11.5 0 -5 11.77 0 -6.53 13.15 0 -5.96 13 0 -5
  [4,0,11.5,0,-5,11.77,0,-6.53,13.15,0,-5.96,13,0,-5],
// 4 0 11.77 0 -3.47 11.5 0 -5 13 0 -5 13.15 0 -4.04
  [4,0,11.77,0,-3.47,11.5,0,-5,13,0,-5,13.15,0,-4.04],
// 4 0 12.53 0 -2.17 11.77 0 -3.47 13.15 0 -4.04 13.59 0 -3.23
  [4,0,12.53,0,-2.17,11.77,0,-3.47,13.15,0,-4.04,13.59,0,-3.23],
// 4 0 13.66 0 -1.3 12.53 0 -2.17 13.59 0 -3.23 14.23 0 -2.69
  [4,0,13.66,0,-1.3,12.53,0,-2.17,13.59,0,-3.23,14.23,0,-2.69],
// 4 0 15 0 -1 13.66 0 -1.3 14.23 0 -2.69 15 0 -2.5
  [4,0,15,0,-1,13.66,0,-1.3,14.23,0,-2.69,15,0,-2.5],
// 
// 3 16 -20 0 10 -18.5 0 5 -18.23 0 6.53
  [3,16,-20,0,10,-18.5,0,5,-18.23,0,6.53],
// 3 16 -20 0 10 -18.23 0 6.53 -17.47 0 7.83
  [3,16,-20,0,10,-18.23,0,6.53,-17.47,0,7.83],
// 3 16 -20 0 10 -17.47 0 7.83 -16.34 0 8.7
  [3,16,-20,0,10,-17.47,0,7.83,-16.34,0,8.7],
// 3 16 -16.34 0 8.7 -15 0 9 -20 0 10
  [3,16,-16.34,0,8.7,-15,0,9,-20,0,10],
// 4 16 -20 0 10 -15 0 9 0 0 9.25 20 0 10
  [4,16,-20,0,10,-15,0,9,0,0,9.25,20,0,10],
// 3 16 0 0 9.25 1.72 0 8.83 20 0 10
  [3,16,0,0,9.25,1.72,0,8.83,20,0,10],
// 3 16 20 0 10 1.72 0 8.83 3.18 0 7.64
  [3,16,20,0,10,1.72,0,8.83,3.18,0,7.64],
// 3 16 20 0 10 3.18 0 7.64 4.16 0 5.85
  [3,16,20,0,10,3.18,0,7.64,4.16,0,5.85],
// 3 16 4.16 0 5.85 4.5 0 3.75 20 0 10
  [3,16,4.16,0,5.85,4.5,0,3.75,20,0,10],
// 4 16 16.34 0 -1.3 20 0 10 4.5 0 3.75 15 0 -1
  [4,16,16.34,0,-1.3,20,0,10,4.5,0,3.75,15,0,-1],
// 3 16 16.34 0 -1.3 17.47 0 -2.17 20 0 10
  [3,16,16.34,0,-1.3,17.47,0,-2.17,20,0,10],
// 3 16 17.47 0 -2.17 18.23 0 -3.47 20 0 10
  [3,16,17.47,0,-2.17,18.23,0,-3.47,20,0,10],
// 4 16 20 0 -10 20 0 10 18.23 0 -3.47 18.5 0 -5
  [4,16,20,0,-10,20,0,10,18.23,0,-3.47,18.5,0,-5],
// 3 16 20 0 -10 18.5 0 -5 18.23 0 -6.53
  [3,16,20,0,-10,18.5,0,-5,18.23,0,-6.53],
// 3 16 20 0 -10 18.23 0 -6.53 17.47 0 -7.83
  [3,16,20,0,-10,18.23,0,-6.53,17.47,0,-7.83],
// 3 16 20 0 -10 17.47 0 -7.83 16.34 0 -8.7
  [3,16,20,0,-10,17.47,0,-7.83,16.34,0,-8.7],
// 3 16 16.34 0 -8.7 15 0 -9 20 0 -10
  [3,16,16.34,0,-8.7,15,0,-9,20,0,-10],
// 3 16 20 0 -10 15 0 -9 5.5 0 -9
  [3,16,20,0,-10,15,0,-9,5.5,0,-9],
// 4 16 20 0 -10 5.5 0 -9 -5.5 0 -9 -20 0 -10
  [4,16,20,0,-10,5.5,0,-9,-5.5,0,-9,-20,0,-10],
// 3 16 -5.5 0 -9 -15 0 -9 -20 0 -10
  [3,16,-5.5,0,-9,-15,0,-9,-20,0,-10],
// 3 16 -20 0 -10 -15 0 -9 -16.34 0 -8.7
  [3,16,-20,0,-10,-15,0,-9,-16.34,0,-8.7],
// 3 16 -20 0 -10 -16.34 0 -8.7 -17.47 0 -7.83
  [3,16,-20,0,-10,-16.34,0,-8.7,-17.47,0,-7.83],
// 3 16 -17.47 0 -7.83 -18.23 0 -6.53 -20 0 -10
  [3,16,-17.47,0,-7.83,-18.23,0,-6.53,-20,0,-10],
// 3 16 -20 0 -10 -18.23 0 -6.53 -18.5 0 -5
  [3,16,-20,0,-10,-18.23,0,-6.53,-18.5,0,-5],
// 4 16 -20 0 -10 -18.5 0 -5 -18.5 0 5 -20 0 10
  [4,16,-20,0,-10,-18.5,0,-5,-18.5,0,5,-20,0,10],
// 4 16 -13.66 0 8.7 -1.72 0 8.83 0 0 9.25 -15 0 9
  [4,16,-13.66,0,8.7,-1.72,0,8.83,0,0,9.25,-15,0,9],
// 4 16 -3.18 0 7.64 -1.72 0 8.83 -13.66 0 8.7 -12.53 0 7.83
  [4,16,-3.18,0,7.64,-1.72,0,8.83,-13.66,0,8.7,-12.53,0,7.83],
// 4 16 -4.16 0 5.85 -3.18 0 7.64 -12.53 0 7.83 -11.77 0 6.53
  [4,16,-4.16,0,5.85,-3.18,0,7.64,-12.53,0,7.83,-11.77,0,6.53],
// 4 16 -4.5 0 3.75 -4.16 0 5.85 -11.77 0 6.53 -11.5 0 5
  [4,16,-4.5,0,3.75,-4.16,0,5.85,-11.77,0,6.53,-11.5,0,5],
// 4 16 -18.5 0 5 -18.5 0 -5 -18.23 0 -3.47 -18.23 0 3.47
  [4,16,-18.5,0,5,-18.5,0,-5,-18.23,0,-3.47,-18.23,0,3.47],
// 4 16 -18.23 0 -3.47 -17.47 0 -2.17 -17.47 0 2.17 -18.23 0 3.47
  [4,16,-18.23,0,-3.47,-17.47,0,-2.17,-17.47,0,2.17,-18.23,0,3.47],
// 4 16 -17.47 0 -2.17 -16.34 0 -1.3 -16.34 0 1.3 -17.47 0 2.17
  [4,16,-17.47,0,-2.17,-16.34,0,-1.3,-16.34,0,1.3,-17.47,0,2.17],
// 4 16 -15 0 1 -16.34 0 1.3 -16.34 0 -1.3 -15 0 -1
  [4,16,-15,0,1,-16.34,0,1.3,-16.34,0,-1.3,-15,0,-1],
// 4 16 -7.97 0 -2.17 -6.84 0 -1.3 -13.66 0 -1.3 -12.53 0 -2.17
  [4,16,-7.97,0,-2.17,-6.84,0,-1.3,-13.66,0,-1.3,-12.53,0,-2.17],
// 4 16 -8.73 0 -3.47 -7.97 0 -2.17 -12.53 0 -2.17 -11.77 0 -3.47
  [4,16,-8.73,0,-3.47,-7.97,0,-2.17,-12.53,0,-2.17,-11.77,0,-3.47],
// 4 16 -9 0 -5 -8.73 0 -3.47 -11.77 0 -3.47 -11.5 0 -5
  [4,16,-9,0,-5,-8.73,0,-3.47,-11.77,0,-3.47,-11.5,0,-5],
// 4 16 -8.73 0 -6.53 -9 0 -5 -11.5 0 -5 -11.77 0 -6.53
  [4,16,-8.73,0,-6.53,-9,0,-5,-11.5,0,-5,-11.77,0,-6.53],
// 4 16 -7.97 0 -7.83 -8.73 0 -6.53 -11.77 0 -6.53 -12.53 0 -7.83
  [4,16,-7.97,0,-7.83,-8.73,0,-6.53,-11.77,0,-6.53,-12.53,0,-7.83],
// 4 16 -7.97 0 -7.83 -12.53 0 -7.83 -13.66 0 -8.7 -6.84 0 -8.7
  [4,16,-7.97,0,-7.83,-12.53,0,-7.83,-13.66,0,-8.7,-6.84,0,-8.7],
// 4 16 -5.5 0 -9 -6.84 0 -8.7 -13.66 0 -8.7 -15 0 -9
  [4,16,-5.5,0,-9,-6.84,0,-8.7,-13.66,0,-8.7,-15,0,-9],
// 4 16 -5.5 0 -9 5.5 0 -9 4.16 0 -8.7 -4.16 0 -8.7
  [4,16,-5.5,0,-9,5.5,0,-9,4.16,0,-8.7,-4.16,0,-8.7],
// 4 16 -4.16 0 -8.7 4.16 0 -8.7 3.03 0 -7.83 -3.03 0 -7.83
  [4,16,-4.16,0,-8.7,4.16,0,-8.7,3.03,0,-7.83,-3.03,0,-7.83],
// 4 16 -3.03 0 -7.83 3.03 0 -7.83 2.27 0 -6.53 -2.27 0 -6.53
  [4,16,-3.03,0,-7.83,3.03,0,-7.83,2.27,0,-6.53,-2.27,0,-6.53],
// 4 16 2.27 0 -6.53 2 0 -5 -2 0 -5 -2.27 0 -6.53
  [4,16,2.27,0,-6.53,2,0,-5,-2,0,-5,-2.27,0,-6.53],
// 4 16 2 0 -5 2.27 0 -3.47 -2.27 0 -3.47 -2 0 -5
  [4,16,2,0,-5,2.27,0,-3.47,-2.27,0,-3.47,-2,0,-5],
// 3 16 2.27 0 -3.47 0 0 -1.75 -2.27 0 -3.47
  [3,16,2.27,0,-3.47,0,0,-1.75,-2.27,0,-3.47],
// 4 16 -3.03 0 -2.17 -2.27 0 -3.47 0 0 -1.75 -1.72 0 -1.33
  [4,16,-3.03,0,-2.17,-2.27,0,-3.47,0,0,-1.75,-1.72,0,-1.33],
// 4 16 -3.03 0 -2.17 -1.72 0 -1.33 -3.18 0 -.14 -4.16 0 -1.3
  [4,16,-3.03,0,-2.17,-1.72,0,-1.33,-3.18,0,-.14,-4.16,0,-1.3],
// 4 16 -4.16 0 -1.3 -3.18 0 -.14 -4.16 0 1.65 -5.5 0 -1
  [4,16,-4.16,0,-1.3,-3.18,0,-.14,-4.16,0,1.65,-5.5,0,-1],
// 4 16 -4.16 0 1.65 -4.5 0 3.75 -11.5 0 5 -11.77 0 3.47
  [4,16,-4.16,0,1.65,-4.5,0,3.75,-11.5,0,5,-11.77,0,3.47],
// 4 16 -15 0 1 -15 0 -1 -13.66 0 -1.3 -13.66 0 1.3
  [4,16,-15,0,1,-15,0,-1,-13.66,0,-1.3,-13.66,0,1.3],
// 3 16 -13.66 0 1.3 -13.66 0 -1.3 -6.84 0 -1.3
  [3,16,-13.66,0,1.3,-13.66,0,-1.3,-6.84,0,-1.3],
// 4 16 -12.53 0 2.17 -5.5 0 -1 -4.16 0 1.65 -11.77 0 3.47
  [4,16,-12.53,0,2.17,-5.5,0,-1,-4.16,0,1.65,-11.77,0,3.47],
// 4 16 -6.84 0 -1.3 -5.5 0 -1 -12.53 0 2.17 -13.66 0 1.3
  [4,16,-6.84,0,-1.3,-5.5,0,-1,-12.53,0,2.17,-13.66,0,1.3],
// 4 16 2.27 0 -3.47 3.03 0 -2.17 1.72 0 -1.33 0 0 -1.75
  [4,16,2.27,0,-3.47,3.03,0,-2.17,1.72,0,-1.33,0,0,-1.75],
// 4 16 3.18 0 -.14 1.72 0 -1.33 3.03 0 -2.17 4.16 0 -1.3
  [4,16,3.18,0,-.14,1.72,0,-1.33,3.03,0,-2.17,4.16,0,-1.3],
// 4 16 3.18 0 -.14 4.16 0 -1.3 5.5 0 -1 4.16 0 1.65
  [4,16,3.18,0,-.14,4.16,0,-1.3,5.5,0,-1,4.16,0,1.65],
// 4 16 4.16 0 1.65 5.5 0 -1 15 0 -1 4.5 0 3.75
  [4,16,4.16,0,1.65,5.5,0,-1,15,0,-1,4.5,0,3.75],
// 4 16 13.66 0 -1.3 15 0 -1 5.5 0 -1 6.84 0 -1.3
  [4,16,13.66,0,-1.3,15,0,-1,5.5,0,-1,6.84,0,-1.3],
// 4 16 12.53 0 -2.17 13.66 0 -1.3 6.84 0 -1.3 7.97 0 -2.17
  [4,16,12.53,0,-2.17,13.66,0,-1.3,6.84,0,-1.3,7.97,0,-2.17],
// 4 16 11.77 0 -3.47 12.53 0 -2.17 7.97 0 -2.17 8.73 0 -3.47
  [4,16,11.77,0,-3.47,12.53,0,-2.17,7.97,0,-2.17,8.73,0,-3.47],
// 4 16 11.5 0 -5 11.77 0 -3.47 8.73 0 -3.47 9 0 -5
  [4,16,11.5,0,-5,11.77,0,-3.47,8.73,0,-3.47,9,0,-5],
// 4 16 11.77 0 -6.53 11.5 0 -5 9 0 -5 8.73 0 -6.53
  [4,16,11.77,0,-6.53,11.5,0,-5,9,0,-5,8.73,0,-6.53],
// 4 16 11.77 0 -6.53 8.73 0 -6.53 7.97 0 -7.83 12.53 0 -7.83
  [4,16,11.77,0,-6.53,8.73,0,-6.53,7.97,0,-7.83,12.53,0,-7.83],
// 4 16 13.66 0 -8.7 12.53 0 -7.83 7.97 0 -7.83 6.84 0 -8.7
  [4,16,13.66,0,-8.7,12.53,0,-7.83,7.97,0,-7.83,6.84,0,-8.7],
// 4 16 15 0 -9 13.66 0 -8.7 6.84 0 -8.7 5.5 0 -9
  [4,16,15,0,-9,13.66,0,-8.7,6.84,0,-8.7,5.5,0,-9],
];
module ldraw_lib__3069bpzj(step=0, col=false, unit=2/5, alt=false, line=0.2, solid=!$preview)
    makepoly(ldraw_lib__3069bpzj(), step=step, col=col, unit=unit, alt=alt, line=line, solid=solid);
ldraw_lib__3069bpzj(line=0.2);
